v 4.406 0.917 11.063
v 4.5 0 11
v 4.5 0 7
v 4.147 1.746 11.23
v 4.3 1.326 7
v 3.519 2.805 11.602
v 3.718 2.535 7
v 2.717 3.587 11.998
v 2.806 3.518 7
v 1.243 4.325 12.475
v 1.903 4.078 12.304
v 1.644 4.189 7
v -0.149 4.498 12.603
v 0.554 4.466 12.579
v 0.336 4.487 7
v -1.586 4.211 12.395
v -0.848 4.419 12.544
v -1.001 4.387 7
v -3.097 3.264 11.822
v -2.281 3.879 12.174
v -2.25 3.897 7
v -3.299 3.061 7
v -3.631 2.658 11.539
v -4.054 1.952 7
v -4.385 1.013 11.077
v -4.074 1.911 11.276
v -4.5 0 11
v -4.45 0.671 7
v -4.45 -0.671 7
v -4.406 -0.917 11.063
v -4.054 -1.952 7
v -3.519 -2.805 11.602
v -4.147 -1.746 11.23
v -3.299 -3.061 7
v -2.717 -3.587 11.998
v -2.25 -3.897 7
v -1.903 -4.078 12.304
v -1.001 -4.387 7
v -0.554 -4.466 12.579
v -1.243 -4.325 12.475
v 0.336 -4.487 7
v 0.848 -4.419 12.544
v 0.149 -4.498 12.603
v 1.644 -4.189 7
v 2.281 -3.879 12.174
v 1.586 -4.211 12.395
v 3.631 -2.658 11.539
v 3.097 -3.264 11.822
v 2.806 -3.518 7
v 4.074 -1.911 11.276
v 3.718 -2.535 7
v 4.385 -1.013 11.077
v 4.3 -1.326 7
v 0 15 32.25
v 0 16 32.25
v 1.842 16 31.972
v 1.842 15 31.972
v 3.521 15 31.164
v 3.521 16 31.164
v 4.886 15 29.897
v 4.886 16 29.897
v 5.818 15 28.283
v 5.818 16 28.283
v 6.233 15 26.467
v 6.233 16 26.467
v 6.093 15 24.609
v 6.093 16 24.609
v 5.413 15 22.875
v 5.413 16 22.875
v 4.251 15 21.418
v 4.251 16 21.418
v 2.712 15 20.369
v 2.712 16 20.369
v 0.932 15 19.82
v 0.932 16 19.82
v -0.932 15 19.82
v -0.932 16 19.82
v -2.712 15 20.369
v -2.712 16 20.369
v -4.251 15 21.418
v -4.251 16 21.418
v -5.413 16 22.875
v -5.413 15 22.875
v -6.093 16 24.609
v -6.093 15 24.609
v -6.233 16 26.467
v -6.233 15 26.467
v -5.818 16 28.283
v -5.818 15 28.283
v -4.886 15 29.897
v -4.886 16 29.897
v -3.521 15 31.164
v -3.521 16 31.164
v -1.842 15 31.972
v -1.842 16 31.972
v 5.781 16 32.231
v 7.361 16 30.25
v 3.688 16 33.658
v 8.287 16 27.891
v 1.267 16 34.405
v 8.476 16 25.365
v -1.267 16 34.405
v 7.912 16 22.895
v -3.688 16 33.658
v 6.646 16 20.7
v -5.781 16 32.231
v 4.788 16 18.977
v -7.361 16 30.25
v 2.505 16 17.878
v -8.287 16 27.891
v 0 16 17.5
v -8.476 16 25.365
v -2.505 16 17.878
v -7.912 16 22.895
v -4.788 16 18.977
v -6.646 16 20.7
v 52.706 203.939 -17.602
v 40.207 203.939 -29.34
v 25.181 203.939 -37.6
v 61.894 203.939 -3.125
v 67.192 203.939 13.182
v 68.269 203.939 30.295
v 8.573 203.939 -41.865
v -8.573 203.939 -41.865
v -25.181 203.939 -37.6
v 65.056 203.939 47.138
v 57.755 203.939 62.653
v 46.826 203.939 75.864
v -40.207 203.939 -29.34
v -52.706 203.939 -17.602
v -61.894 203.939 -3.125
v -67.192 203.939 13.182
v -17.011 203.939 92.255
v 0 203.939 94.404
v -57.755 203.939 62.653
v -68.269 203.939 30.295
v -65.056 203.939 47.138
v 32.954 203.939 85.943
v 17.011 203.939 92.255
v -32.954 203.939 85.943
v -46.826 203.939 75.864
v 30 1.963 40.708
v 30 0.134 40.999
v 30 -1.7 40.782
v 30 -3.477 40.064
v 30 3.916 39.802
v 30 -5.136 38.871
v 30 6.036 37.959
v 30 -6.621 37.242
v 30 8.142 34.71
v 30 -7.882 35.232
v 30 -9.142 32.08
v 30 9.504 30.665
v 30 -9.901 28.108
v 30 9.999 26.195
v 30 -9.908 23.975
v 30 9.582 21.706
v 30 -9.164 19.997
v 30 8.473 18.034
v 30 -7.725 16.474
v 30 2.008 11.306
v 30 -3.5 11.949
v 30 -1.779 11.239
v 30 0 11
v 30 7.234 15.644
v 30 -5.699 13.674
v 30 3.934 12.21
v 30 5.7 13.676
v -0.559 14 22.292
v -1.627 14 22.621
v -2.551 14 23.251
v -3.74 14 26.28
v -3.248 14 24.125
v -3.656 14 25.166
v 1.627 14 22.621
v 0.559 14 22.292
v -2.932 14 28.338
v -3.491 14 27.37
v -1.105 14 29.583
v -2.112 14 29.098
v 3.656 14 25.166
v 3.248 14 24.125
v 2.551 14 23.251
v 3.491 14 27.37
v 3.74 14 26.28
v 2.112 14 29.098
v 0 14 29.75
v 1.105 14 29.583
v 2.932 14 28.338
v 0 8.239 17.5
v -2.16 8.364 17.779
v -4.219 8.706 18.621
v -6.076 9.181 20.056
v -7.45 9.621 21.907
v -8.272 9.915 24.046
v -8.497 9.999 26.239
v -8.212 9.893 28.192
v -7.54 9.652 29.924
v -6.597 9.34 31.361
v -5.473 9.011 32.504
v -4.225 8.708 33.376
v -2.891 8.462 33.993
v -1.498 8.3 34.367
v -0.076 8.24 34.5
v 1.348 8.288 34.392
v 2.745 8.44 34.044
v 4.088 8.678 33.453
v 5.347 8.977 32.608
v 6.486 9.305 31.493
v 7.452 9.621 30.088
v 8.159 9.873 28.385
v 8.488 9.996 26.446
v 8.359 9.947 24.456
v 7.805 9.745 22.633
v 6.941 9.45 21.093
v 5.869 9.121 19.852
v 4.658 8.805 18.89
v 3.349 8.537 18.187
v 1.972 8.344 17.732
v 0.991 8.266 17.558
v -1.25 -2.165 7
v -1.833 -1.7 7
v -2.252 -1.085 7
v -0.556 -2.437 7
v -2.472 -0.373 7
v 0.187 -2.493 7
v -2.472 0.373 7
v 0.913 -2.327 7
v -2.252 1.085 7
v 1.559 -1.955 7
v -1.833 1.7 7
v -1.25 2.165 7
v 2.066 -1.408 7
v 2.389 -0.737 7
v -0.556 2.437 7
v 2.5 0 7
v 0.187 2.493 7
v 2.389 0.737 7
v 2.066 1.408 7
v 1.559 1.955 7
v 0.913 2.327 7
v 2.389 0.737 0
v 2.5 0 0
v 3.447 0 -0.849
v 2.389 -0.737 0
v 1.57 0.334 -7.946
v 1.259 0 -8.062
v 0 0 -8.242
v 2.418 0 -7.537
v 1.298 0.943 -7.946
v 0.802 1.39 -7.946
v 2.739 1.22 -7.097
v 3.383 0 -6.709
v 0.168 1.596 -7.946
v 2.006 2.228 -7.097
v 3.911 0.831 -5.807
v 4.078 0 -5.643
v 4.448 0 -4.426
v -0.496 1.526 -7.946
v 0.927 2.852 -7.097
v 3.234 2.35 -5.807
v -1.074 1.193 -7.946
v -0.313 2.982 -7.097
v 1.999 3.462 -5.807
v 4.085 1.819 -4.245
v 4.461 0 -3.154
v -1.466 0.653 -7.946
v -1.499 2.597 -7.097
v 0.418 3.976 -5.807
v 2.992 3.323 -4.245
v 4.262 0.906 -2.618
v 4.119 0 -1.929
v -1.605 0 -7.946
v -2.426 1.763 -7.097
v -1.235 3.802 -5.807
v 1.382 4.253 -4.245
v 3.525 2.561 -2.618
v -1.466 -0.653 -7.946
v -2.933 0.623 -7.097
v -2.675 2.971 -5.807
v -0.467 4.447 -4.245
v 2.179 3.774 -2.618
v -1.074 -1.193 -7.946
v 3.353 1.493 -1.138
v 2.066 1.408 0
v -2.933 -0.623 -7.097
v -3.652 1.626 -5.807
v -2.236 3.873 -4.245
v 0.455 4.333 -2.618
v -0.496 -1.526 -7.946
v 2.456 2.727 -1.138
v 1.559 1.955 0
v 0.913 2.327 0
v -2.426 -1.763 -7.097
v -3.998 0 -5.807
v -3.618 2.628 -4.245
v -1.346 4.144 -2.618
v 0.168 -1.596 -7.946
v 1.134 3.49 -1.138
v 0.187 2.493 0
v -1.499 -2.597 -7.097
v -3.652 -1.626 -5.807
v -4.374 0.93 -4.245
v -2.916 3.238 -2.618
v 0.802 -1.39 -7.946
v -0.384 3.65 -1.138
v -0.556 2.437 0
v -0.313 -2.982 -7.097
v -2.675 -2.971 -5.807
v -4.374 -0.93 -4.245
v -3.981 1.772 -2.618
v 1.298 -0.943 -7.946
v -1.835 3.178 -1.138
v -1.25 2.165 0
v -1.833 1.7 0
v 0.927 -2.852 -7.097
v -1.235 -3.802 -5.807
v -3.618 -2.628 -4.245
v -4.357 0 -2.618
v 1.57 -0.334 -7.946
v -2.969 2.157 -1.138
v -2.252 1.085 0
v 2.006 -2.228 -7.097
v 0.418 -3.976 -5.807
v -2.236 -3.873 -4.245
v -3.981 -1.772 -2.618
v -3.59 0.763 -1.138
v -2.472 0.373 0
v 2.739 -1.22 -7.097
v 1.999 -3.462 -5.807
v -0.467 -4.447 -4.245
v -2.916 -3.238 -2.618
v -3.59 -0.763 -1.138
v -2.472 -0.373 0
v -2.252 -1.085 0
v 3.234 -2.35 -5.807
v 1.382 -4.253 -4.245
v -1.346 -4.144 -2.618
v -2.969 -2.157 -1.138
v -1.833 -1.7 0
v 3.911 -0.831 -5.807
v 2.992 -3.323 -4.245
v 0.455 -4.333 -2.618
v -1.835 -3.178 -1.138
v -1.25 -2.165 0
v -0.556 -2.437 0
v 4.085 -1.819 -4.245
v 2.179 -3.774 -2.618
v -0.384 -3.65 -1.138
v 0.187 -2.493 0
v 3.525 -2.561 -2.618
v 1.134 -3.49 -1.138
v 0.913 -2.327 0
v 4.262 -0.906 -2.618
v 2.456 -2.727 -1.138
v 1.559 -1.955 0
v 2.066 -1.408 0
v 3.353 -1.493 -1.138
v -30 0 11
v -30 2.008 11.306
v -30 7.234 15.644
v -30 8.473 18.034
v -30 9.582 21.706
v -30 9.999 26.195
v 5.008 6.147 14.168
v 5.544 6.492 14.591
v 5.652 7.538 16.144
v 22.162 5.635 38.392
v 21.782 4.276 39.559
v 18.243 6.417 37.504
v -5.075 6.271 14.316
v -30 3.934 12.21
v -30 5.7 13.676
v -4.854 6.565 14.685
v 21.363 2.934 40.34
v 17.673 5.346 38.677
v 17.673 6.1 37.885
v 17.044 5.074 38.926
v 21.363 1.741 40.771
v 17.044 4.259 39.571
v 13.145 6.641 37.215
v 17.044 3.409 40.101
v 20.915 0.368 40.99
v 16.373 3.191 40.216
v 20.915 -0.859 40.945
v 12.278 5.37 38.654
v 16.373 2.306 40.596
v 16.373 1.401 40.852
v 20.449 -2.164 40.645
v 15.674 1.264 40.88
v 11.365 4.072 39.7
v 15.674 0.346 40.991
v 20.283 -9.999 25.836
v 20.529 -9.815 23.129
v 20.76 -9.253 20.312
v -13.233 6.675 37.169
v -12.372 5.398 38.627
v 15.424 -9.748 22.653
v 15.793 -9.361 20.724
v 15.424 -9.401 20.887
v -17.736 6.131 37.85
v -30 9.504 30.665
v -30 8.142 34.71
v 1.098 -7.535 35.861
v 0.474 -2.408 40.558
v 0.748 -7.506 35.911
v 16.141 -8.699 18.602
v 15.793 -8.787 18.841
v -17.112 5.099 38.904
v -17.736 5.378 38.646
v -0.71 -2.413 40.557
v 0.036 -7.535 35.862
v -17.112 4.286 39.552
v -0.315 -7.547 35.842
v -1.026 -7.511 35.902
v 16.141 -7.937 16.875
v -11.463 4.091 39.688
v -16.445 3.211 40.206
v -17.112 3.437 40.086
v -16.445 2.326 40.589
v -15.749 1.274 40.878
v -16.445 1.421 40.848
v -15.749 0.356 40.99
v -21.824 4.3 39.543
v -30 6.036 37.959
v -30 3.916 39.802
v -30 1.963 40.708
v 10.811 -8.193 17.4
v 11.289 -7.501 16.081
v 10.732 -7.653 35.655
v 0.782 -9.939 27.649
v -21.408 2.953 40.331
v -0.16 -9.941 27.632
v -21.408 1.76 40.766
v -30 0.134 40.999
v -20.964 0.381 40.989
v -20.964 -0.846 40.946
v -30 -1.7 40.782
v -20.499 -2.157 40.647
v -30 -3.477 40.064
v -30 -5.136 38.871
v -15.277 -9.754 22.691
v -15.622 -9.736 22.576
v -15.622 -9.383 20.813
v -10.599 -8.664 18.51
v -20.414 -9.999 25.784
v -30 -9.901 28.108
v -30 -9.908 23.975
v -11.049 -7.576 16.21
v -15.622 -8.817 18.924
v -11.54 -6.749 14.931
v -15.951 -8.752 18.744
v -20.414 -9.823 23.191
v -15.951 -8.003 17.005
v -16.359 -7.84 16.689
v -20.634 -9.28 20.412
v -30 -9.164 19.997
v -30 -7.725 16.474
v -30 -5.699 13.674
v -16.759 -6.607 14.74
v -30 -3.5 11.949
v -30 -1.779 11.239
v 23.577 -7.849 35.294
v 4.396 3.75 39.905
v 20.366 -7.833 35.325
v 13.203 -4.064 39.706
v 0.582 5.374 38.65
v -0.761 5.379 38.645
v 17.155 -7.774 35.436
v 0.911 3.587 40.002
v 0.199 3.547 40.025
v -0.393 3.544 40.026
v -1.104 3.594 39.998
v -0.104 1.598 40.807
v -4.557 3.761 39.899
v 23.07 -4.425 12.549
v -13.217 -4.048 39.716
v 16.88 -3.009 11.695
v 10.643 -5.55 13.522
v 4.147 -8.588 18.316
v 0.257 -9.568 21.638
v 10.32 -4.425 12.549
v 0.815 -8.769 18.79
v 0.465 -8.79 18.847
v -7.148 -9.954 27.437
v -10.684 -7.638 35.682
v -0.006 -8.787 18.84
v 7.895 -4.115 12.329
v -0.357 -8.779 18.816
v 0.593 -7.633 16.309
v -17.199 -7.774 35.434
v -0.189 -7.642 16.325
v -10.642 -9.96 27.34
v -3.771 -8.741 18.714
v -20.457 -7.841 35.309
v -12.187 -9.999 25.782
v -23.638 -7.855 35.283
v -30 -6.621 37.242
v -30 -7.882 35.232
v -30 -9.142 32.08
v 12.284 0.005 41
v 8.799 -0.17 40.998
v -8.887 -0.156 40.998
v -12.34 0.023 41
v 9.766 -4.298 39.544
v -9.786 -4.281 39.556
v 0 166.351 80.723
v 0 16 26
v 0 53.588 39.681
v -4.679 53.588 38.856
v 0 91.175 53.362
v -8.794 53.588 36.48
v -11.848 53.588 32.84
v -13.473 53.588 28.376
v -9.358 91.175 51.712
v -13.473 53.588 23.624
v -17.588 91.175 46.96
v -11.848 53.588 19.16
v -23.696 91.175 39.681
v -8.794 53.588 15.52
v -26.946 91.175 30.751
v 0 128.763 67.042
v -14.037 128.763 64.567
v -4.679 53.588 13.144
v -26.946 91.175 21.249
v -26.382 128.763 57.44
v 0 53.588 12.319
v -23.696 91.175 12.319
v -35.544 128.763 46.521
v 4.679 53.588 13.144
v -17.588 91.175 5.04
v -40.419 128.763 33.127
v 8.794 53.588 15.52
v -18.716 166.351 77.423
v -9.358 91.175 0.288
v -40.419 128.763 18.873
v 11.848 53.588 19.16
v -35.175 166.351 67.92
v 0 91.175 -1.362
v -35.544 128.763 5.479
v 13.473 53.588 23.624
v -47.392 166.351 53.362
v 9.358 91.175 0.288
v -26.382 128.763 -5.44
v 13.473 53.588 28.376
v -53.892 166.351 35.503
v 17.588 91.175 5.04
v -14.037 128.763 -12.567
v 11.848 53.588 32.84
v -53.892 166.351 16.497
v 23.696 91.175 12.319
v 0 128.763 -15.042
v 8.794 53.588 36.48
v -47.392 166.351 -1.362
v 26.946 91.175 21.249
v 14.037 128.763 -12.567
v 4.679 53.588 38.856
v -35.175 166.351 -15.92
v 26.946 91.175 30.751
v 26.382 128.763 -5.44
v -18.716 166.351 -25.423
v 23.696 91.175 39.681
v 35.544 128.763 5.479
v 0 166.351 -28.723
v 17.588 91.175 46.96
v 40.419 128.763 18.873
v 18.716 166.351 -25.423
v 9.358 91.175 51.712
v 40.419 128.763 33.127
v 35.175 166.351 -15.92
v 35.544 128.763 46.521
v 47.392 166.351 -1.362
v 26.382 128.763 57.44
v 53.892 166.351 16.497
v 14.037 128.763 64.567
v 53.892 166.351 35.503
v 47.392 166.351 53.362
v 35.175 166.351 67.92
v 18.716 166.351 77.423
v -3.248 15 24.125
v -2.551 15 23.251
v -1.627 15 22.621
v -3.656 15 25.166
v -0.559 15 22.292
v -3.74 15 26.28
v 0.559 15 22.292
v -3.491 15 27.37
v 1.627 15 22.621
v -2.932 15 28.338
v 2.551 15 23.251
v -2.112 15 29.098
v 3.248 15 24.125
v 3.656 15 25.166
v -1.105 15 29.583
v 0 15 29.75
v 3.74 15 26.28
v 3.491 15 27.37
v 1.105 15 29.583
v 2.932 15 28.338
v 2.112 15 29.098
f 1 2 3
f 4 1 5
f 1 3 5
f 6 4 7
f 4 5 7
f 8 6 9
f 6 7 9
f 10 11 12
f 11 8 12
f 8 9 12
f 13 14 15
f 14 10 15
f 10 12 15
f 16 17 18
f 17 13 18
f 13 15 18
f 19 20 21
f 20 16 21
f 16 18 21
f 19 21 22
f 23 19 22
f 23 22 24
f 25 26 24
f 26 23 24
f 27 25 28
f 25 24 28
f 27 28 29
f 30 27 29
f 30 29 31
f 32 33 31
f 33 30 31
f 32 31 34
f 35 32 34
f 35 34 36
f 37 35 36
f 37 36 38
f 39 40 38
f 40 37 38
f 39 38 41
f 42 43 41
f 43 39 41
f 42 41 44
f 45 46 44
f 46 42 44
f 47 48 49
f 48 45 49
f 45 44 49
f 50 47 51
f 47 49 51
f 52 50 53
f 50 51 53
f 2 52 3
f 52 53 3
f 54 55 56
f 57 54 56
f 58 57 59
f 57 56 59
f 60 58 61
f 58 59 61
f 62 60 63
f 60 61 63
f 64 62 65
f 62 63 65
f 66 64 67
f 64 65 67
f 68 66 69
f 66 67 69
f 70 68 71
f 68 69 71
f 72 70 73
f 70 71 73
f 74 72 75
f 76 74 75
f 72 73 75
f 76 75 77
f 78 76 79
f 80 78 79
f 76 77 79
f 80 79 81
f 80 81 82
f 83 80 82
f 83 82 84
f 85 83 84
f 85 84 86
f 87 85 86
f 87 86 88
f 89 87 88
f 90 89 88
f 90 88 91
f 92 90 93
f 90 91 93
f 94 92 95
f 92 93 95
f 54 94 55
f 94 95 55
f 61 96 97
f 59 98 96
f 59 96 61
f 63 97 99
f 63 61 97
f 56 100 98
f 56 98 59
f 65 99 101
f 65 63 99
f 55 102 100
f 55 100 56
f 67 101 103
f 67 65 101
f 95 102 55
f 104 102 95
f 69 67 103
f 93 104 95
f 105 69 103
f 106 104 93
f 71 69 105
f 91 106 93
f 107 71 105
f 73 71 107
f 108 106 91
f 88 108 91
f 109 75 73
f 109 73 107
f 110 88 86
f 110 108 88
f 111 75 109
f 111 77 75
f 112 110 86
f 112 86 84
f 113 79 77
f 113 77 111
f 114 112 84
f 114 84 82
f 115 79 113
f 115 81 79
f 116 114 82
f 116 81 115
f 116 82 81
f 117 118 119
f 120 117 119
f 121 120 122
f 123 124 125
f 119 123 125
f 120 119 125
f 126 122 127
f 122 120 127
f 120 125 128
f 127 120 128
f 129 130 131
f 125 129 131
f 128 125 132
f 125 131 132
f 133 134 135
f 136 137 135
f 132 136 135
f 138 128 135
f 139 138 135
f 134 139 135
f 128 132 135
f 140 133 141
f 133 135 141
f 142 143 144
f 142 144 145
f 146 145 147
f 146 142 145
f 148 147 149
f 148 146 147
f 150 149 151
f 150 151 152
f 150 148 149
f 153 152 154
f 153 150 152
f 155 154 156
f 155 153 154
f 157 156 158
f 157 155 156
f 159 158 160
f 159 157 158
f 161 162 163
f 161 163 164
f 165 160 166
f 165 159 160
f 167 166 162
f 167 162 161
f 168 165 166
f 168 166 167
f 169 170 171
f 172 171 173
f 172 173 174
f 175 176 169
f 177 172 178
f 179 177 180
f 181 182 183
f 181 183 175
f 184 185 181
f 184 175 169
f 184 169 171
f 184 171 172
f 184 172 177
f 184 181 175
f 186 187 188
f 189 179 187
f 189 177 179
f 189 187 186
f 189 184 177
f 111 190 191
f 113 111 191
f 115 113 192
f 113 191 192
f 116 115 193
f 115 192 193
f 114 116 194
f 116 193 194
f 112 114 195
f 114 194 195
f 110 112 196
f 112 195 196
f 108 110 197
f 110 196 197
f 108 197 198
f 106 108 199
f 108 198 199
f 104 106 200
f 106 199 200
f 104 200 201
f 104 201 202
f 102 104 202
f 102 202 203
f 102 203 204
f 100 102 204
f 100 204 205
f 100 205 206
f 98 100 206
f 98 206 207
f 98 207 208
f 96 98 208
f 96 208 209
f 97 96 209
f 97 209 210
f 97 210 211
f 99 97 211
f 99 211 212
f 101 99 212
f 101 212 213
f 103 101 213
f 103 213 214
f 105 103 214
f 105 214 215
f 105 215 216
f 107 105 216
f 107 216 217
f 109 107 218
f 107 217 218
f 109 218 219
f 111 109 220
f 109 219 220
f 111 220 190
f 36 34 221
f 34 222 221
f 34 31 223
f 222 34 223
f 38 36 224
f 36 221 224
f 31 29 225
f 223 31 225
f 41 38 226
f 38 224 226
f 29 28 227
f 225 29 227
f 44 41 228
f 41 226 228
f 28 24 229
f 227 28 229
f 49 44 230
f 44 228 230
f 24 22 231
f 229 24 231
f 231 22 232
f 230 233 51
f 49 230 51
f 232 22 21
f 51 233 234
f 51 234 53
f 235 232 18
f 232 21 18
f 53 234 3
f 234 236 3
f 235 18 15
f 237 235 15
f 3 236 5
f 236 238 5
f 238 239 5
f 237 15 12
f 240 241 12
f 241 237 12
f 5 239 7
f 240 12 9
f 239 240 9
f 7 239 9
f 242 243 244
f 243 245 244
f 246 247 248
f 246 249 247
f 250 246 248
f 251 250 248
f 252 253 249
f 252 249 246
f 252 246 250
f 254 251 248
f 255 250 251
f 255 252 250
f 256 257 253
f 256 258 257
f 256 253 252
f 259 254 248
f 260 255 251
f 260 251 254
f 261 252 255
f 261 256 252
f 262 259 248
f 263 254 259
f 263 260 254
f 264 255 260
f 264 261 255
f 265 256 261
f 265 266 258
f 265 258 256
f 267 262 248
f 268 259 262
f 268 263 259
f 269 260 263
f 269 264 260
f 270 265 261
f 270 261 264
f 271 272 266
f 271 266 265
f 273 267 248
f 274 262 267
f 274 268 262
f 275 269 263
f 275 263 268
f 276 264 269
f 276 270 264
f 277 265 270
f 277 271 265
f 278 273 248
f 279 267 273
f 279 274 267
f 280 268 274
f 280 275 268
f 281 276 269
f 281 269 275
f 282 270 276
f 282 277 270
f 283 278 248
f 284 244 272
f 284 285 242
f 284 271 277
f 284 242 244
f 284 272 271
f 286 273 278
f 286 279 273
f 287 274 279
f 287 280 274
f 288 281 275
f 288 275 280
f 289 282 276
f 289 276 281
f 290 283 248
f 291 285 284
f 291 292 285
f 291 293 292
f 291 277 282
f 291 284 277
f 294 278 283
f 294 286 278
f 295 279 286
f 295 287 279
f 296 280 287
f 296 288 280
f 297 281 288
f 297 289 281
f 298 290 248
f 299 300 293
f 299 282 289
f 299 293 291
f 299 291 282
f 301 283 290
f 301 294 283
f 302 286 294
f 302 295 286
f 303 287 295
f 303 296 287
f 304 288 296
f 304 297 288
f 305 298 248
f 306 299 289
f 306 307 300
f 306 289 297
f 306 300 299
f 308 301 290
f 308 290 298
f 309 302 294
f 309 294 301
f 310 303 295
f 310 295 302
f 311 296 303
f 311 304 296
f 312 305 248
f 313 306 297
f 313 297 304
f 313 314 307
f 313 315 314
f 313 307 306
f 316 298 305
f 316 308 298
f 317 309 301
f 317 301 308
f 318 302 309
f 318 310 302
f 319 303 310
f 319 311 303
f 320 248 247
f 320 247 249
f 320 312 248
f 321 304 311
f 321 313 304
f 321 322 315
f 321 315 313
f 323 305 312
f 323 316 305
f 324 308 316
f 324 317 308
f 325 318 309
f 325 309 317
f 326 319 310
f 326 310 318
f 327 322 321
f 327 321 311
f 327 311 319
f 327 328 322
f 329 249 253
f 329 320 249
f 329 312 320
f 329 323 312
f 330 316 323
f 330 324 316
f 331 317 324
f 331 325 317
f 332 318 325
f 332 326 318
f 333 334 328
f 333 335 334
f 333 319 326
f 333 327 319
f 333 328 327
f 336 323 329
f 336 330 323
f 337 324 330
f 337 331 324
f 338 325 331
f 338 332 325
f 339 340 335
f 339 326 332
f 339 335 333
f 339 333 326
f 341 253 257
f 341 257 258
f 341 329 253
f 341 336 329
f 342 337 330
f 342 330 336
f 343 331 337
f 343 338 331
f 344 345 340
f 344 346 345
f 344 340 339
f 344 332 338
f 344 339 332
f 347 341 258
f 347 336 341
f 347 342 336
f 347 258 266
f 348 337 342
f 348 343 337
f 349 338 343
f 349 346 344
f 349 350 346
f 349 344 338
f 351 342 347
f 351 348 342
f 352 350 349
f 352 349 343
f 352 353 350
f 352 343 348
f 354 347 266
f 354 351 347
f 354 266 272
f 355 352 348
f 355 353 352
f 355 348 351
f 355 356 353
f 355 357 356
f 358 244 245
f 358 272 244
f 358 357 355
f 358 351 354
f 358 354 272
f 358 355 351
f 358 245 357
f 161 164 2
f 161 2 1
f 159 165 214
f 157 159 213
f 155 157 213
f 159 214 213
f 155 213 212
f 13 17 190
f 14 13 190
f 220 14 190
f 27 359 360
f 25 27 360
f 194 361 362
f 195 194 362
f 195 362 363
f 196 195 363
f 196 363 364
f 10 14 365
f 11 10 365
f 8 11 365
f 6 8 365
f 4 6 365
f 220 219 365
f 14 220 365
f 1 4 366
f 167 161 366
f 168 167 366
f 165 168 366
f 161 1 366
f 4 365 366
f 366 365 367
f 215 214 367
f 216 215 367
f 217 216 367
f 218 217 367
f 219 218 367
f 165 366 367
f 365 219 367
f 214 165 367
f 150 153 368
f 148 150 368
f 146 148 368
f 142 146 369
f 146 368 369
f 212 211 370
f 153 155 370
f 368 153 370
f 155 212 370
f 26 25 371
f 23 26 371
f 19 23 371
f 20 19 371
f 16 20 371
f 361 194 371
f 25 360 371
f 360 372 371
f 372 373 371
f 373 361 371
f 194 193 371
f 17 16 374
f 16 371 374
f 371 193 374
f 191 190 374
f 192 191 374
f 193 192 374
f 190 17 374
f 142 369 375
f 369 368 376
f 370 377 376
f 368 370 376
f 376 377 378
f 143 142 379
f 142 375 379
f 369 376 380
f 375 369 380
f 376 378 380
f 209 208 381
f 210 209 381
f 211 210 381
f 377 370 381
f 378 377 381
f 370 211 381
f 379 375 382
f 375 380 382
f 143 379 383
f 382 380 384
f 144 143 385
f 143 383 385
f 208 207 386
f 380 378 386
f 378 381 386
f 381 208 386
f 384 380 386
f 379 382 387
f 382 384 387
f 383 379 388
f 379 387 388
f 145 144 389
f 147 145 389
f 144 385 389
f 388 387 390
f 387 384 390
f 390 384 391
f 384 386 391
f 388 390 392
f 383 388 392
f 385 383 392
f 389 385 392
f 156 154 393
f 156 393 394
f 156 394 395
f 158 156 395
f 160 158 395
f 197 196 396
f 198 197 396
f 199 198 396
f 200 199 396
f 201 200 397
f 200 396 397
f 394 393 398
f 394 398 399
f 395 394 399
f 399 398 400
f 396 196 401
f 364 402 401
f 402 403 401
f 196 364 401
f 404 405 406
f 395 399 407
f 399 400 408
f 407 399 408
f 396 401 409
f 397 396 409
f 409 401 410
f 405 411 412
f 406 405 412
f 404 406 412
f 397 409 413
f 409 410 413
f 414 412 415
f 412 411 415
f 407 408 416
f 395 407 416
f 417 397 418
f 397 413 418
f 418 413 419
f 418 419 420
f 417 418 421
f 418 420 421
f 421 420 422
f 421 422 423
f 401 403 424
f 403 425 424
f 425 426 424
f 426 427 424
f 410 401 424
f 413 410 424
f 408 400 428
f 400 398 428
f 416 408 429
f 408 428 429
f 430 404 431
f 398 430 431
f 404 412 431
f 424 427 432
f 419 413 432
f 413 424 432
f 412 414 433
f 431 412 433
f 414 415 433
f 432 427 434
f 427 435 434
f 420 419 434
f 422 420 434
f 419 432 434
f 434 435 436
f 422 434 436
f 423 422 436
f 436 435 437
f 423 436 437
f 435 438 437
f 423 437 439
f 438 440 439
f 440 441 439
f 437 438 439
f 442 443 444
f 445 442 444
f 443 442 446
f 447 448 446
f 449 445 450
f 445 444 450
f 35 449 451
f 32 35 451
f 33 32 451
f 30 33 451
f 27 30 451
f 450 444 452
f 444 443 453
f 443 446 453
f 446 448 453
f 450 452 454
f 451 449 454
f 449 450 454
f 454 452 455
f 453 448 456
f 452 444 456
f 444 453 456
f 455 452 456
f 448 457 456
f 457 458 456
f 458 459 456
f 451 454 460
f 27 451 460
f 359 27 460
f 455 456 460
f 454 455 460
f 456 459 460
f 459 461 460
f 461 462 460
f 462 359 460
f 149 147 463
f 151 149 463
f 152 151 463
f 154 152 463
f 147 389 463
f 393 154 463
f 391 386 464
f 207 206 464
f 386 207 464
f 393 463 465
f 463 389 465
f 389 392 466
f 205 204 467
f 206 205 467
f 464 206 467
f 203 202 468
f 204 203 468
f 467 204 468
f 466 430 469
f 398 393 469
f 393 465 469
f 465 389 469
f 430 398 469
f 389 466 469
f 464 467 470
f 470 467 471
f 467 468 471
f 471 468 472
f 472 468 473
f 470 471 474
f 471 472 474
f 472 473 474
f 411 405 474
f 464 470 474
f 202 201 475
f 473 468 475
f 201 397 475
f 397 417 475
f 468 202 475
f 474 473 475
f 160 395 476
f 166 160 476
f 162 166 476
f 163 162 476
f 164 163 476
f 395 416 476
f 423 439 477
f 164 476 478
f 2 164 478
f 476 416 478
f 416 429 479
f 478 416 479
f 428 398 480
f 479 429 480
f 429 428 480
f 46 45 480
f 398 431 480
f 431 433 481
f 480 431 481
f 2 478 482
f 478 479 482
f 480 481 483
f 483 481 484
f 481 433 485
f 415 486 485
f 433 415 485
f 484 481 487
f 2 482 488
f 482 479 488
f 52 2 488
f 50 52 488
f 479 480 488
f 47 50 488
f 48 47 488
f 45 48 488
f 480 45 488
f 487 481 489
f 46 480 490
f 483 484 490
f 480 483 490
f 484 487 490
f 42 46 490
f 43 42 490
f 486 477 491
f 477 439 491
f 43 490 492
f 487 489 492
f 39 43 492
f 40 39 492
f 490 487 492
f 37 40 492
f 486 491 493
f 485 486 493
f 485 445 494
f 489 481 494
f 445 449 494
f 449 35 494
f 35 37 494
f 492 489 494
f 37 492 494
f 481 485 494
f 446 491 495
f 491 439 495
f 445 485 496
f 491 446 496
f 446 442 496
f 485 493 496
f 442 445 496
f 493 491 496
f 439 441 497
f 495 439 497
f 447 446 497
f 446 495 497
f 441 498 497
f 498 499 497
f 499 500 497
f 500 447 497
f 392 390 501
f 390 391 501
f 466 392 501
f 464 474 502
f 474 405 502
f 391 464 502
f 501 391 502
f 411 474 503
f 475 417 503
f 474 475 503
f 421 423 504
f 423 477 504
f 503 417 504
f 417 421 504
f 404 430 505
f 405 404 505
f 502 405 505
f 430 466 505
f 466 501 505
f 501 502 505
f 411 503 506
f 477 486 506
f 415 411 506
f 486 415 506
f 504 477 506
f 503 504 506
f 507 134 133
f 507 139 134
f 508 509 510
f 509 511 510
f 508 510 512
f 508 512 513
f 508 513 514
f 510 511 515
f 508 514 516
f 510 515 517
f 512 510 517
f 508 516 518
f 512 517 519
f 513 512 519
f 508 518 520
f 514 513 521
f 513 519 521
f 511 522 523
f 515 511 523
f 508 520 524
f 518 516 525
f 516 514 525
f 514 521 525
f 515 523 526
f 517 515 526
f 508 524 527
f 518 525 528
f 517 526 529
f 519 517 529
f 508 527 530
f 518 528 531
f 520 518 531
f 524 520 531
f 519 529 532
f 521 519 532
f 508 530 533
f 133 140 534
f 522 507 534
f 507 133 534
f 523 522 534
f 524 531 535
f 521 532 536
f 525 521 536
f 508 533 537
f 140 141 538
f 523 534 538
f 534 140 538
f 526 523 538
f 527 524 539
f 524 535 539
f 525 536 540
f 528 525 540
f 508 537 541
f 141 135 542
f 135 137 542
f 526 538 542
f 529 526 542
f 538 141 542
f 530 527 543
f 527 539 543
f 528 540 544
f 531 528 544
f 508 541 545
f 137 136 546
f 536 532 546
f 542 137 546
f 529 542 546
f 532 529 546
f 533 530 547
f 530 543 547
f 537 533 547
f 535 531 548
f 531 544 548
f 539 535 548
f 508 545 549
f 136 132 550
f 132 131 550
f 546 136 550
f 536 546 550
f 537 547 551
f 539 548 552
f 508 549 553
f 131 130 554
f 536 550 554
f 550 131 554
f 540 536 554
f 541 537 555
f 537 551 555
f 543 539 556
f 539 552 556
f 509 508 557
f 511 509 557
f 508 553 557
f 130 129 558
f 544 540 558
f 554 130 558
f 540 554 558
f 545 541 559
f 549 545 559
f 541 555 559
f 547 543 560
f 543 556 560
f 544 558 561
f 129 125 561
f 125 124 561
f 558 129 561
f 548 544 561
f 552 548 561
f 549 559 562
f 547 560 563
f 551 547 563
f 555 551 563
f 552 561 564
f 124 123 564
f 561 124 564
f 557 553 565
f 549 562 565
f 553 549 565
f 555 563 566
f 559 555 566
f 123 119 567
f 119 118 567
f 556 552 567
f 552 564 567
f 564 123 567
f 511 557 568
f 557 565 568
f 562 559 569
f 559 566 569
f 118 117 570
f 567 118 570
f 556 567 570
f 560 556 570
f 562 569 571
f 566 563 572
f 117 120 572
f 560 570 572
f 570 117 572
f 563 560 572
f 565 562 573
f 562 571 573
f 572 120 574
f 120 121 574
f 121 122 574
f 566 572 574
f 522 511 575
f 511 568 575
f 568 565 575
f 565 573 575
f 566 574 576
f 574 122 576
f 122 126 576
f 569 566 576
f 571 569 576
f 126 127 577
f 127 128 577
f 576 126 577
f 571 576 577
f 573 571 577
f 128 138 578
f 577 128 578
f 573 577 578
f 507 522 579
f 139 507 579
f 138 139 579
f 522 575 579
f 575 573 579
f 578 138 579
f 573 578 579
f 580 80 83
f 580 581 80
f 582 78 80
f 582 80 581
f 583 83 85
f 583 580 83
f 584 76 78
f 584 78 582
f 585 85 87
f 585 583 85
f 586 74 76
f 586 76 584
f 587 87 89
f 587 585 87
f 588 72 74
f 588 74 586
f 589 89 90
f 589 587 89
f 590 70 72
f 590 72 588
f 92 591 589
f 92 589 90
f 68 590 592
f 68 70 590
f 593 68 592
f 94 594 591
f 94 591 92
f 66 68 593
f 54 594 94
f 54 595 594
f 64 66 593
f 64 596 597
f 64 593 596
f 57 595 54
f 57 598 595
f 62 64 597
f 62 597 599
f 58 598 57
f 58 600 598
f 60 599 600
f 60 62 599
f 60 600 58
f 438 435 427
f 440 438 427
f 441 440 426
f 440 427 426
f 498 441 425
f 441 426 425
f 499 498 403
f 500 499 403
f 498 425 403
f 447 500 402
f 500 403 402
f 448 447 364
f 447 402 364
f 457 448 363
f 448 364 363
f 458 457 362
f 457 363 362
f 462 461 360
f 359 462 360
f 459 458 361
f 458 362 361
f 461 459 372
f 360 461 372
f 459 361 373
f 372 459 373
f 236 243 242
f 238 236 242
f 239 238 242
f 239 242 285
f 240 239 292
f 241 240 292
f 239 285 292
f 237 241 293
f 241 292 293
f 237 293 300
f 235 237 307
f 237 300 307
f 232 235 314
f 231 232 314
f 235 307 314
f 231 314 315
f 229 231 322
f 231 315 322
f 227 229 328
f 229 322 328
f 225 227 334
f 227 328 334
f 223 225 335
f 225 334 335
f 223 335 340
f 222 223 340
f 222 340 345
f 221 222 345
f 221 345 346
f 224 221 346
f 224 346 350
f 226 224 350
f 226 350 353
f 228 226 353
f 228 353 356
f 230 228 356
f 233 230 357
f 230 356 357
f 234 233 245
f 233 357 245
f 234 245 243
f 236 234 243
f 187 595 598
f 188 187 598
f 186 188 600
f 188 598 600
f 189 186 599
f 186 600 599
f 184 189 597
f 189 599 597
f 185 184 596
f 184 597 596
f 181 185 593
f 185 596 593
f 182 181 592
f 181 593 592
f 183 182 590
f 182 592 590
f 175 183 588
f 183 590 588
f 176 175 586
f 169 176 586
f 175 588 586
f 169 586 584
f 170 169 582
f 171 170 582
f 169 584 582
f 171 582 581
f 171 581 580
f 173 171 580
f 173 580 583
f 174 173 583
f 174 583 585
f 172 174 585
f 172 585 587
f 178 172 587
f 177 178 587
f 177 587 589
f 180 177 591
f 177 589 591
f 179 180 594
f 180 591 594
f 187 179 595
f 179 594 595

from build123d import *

# Parameters (mm, degrees)
SKETCH_1_R           = 2.5
EXTRUDE_1_DEPTH      = 7
SKETCH_2_R           = 4.5
EXTRUDE_2_DEPTH      = 10
EXTRUDE_3_DEPTH      = 30
EXTRUDE_3_DEPTH_BACK = 30
SKETCH_3_RX          = 15
SKETCH_3_RY          = 10
SKETCH_4_R           = 8.5
EXTRUDE_4_DEPTH      = 16
SKETCH_5_R           = 6.25
CUT_EXTRUDE_1_DEPTH  = 1
SKETCH_6_R           = 3.75
CUT_EXTRUDE_2_DEPTH  = 1


with BuildPart() as part:
    # 草图1 → 凸台-拉伸1 (new body)
    with BuildSketch(Plane.XY):
        Circle(SKETCH_1_R)
    extrude(amount=EXTRUDE_1_DEPTH)

    # 草图2 → 凸台-拉伸2 (add)
    with BuildSketch(Plane.XY.offset(7)):
        Circle(SKETCH_2_R)
    extrude(amount=EXTRUDE_2_DEPTH)

    # 草图3 → 凸台-拉伸3 (add, two sides: drawn at the far end of the back side and taken through both)
    with BuildSketch(Plane(origin=(0, 0, 0), x_dir=(0, 0, -1), z_dir=(1, 0, 0)).offset(-EXTRUDE_3_DEPTH_BACK)):
        with Locations((-26, 0)):
            Ellipse(SKETCH_3_RX, SKETCH_3_RY)
    extrude(amount=EXTRUDE_3_DEPTH + EXTRUDE_3_DEPTH_BACK)

    # 草图4 → 凸台-拉伸4 (add)
    with BuildSketch(Plane(origin=(0, 0, 0), x_dir=(1, 0, 0), z_dir=(0, 1, 0))):
        with Locations((0, -26)):
            Circle(SKETCH_4_R)
    extrude(amount=EXTRUDE_4_DEPTH)

    # 草图5 → 切除-拉伸1 (cut)
    with BuildSketch(Plane(origin=(0, 16, 0), x_dir=(1, 0, 0), z_dir=(0, 1, 0))):
        with Locations((0, -26)):
            Circle(SKETCH_5_R)
    extrude(amount=-CUT_EXTRUDE_1_DEPTH, mode=Mode.SUBTRACT)

    # 草图6 → 切除-拉伸2 (cut)
    with BuildSketch(Plane(origin=(0, 15, 0), x_dir=(1, 0, 0), z_dir=(0, 1, 0))):
        with Locations((0, -26)):
            Circle(SKETCH_6_R)
    extrude(amount=-CUT_EXTRUDE_2_DEPTH, mode=Mode.SUBTRACT)

    # 草图7 → 旋转3 (revolve)
    with BuildSketch(Plane(origin=(0, 0, 0), x_dir=(1, 0, 0), z_dir=(0, 1, 0))):
        with BuildLine():
            Line((0, -0.758342613), (0, 8.241657387))
            ThreePointArc((0, 8.241657387), (4.5, 3.741657387), (0, -0.758342613))
        make_face()
    revolve(axis=Axis((0, 0, -10.703740256), (0, 0, 1)))


with BuildPart() as body_2:
    # 草图8 → 旋转4 (revolve)
    with BuildSketch(Plane(origin=(0, 0, 0), x_dir=(0, 0, -1), z_dir=(1, 0, 0))):
        Polygon((-26, 16), (42.404028665, 203.938524157), (-26, 203.938524157), align=None)
    revolve(axis=Axis((0, 203.938524157, 26), (0, -1, 0)))


solid = Compound([part.part, body_2.part])
